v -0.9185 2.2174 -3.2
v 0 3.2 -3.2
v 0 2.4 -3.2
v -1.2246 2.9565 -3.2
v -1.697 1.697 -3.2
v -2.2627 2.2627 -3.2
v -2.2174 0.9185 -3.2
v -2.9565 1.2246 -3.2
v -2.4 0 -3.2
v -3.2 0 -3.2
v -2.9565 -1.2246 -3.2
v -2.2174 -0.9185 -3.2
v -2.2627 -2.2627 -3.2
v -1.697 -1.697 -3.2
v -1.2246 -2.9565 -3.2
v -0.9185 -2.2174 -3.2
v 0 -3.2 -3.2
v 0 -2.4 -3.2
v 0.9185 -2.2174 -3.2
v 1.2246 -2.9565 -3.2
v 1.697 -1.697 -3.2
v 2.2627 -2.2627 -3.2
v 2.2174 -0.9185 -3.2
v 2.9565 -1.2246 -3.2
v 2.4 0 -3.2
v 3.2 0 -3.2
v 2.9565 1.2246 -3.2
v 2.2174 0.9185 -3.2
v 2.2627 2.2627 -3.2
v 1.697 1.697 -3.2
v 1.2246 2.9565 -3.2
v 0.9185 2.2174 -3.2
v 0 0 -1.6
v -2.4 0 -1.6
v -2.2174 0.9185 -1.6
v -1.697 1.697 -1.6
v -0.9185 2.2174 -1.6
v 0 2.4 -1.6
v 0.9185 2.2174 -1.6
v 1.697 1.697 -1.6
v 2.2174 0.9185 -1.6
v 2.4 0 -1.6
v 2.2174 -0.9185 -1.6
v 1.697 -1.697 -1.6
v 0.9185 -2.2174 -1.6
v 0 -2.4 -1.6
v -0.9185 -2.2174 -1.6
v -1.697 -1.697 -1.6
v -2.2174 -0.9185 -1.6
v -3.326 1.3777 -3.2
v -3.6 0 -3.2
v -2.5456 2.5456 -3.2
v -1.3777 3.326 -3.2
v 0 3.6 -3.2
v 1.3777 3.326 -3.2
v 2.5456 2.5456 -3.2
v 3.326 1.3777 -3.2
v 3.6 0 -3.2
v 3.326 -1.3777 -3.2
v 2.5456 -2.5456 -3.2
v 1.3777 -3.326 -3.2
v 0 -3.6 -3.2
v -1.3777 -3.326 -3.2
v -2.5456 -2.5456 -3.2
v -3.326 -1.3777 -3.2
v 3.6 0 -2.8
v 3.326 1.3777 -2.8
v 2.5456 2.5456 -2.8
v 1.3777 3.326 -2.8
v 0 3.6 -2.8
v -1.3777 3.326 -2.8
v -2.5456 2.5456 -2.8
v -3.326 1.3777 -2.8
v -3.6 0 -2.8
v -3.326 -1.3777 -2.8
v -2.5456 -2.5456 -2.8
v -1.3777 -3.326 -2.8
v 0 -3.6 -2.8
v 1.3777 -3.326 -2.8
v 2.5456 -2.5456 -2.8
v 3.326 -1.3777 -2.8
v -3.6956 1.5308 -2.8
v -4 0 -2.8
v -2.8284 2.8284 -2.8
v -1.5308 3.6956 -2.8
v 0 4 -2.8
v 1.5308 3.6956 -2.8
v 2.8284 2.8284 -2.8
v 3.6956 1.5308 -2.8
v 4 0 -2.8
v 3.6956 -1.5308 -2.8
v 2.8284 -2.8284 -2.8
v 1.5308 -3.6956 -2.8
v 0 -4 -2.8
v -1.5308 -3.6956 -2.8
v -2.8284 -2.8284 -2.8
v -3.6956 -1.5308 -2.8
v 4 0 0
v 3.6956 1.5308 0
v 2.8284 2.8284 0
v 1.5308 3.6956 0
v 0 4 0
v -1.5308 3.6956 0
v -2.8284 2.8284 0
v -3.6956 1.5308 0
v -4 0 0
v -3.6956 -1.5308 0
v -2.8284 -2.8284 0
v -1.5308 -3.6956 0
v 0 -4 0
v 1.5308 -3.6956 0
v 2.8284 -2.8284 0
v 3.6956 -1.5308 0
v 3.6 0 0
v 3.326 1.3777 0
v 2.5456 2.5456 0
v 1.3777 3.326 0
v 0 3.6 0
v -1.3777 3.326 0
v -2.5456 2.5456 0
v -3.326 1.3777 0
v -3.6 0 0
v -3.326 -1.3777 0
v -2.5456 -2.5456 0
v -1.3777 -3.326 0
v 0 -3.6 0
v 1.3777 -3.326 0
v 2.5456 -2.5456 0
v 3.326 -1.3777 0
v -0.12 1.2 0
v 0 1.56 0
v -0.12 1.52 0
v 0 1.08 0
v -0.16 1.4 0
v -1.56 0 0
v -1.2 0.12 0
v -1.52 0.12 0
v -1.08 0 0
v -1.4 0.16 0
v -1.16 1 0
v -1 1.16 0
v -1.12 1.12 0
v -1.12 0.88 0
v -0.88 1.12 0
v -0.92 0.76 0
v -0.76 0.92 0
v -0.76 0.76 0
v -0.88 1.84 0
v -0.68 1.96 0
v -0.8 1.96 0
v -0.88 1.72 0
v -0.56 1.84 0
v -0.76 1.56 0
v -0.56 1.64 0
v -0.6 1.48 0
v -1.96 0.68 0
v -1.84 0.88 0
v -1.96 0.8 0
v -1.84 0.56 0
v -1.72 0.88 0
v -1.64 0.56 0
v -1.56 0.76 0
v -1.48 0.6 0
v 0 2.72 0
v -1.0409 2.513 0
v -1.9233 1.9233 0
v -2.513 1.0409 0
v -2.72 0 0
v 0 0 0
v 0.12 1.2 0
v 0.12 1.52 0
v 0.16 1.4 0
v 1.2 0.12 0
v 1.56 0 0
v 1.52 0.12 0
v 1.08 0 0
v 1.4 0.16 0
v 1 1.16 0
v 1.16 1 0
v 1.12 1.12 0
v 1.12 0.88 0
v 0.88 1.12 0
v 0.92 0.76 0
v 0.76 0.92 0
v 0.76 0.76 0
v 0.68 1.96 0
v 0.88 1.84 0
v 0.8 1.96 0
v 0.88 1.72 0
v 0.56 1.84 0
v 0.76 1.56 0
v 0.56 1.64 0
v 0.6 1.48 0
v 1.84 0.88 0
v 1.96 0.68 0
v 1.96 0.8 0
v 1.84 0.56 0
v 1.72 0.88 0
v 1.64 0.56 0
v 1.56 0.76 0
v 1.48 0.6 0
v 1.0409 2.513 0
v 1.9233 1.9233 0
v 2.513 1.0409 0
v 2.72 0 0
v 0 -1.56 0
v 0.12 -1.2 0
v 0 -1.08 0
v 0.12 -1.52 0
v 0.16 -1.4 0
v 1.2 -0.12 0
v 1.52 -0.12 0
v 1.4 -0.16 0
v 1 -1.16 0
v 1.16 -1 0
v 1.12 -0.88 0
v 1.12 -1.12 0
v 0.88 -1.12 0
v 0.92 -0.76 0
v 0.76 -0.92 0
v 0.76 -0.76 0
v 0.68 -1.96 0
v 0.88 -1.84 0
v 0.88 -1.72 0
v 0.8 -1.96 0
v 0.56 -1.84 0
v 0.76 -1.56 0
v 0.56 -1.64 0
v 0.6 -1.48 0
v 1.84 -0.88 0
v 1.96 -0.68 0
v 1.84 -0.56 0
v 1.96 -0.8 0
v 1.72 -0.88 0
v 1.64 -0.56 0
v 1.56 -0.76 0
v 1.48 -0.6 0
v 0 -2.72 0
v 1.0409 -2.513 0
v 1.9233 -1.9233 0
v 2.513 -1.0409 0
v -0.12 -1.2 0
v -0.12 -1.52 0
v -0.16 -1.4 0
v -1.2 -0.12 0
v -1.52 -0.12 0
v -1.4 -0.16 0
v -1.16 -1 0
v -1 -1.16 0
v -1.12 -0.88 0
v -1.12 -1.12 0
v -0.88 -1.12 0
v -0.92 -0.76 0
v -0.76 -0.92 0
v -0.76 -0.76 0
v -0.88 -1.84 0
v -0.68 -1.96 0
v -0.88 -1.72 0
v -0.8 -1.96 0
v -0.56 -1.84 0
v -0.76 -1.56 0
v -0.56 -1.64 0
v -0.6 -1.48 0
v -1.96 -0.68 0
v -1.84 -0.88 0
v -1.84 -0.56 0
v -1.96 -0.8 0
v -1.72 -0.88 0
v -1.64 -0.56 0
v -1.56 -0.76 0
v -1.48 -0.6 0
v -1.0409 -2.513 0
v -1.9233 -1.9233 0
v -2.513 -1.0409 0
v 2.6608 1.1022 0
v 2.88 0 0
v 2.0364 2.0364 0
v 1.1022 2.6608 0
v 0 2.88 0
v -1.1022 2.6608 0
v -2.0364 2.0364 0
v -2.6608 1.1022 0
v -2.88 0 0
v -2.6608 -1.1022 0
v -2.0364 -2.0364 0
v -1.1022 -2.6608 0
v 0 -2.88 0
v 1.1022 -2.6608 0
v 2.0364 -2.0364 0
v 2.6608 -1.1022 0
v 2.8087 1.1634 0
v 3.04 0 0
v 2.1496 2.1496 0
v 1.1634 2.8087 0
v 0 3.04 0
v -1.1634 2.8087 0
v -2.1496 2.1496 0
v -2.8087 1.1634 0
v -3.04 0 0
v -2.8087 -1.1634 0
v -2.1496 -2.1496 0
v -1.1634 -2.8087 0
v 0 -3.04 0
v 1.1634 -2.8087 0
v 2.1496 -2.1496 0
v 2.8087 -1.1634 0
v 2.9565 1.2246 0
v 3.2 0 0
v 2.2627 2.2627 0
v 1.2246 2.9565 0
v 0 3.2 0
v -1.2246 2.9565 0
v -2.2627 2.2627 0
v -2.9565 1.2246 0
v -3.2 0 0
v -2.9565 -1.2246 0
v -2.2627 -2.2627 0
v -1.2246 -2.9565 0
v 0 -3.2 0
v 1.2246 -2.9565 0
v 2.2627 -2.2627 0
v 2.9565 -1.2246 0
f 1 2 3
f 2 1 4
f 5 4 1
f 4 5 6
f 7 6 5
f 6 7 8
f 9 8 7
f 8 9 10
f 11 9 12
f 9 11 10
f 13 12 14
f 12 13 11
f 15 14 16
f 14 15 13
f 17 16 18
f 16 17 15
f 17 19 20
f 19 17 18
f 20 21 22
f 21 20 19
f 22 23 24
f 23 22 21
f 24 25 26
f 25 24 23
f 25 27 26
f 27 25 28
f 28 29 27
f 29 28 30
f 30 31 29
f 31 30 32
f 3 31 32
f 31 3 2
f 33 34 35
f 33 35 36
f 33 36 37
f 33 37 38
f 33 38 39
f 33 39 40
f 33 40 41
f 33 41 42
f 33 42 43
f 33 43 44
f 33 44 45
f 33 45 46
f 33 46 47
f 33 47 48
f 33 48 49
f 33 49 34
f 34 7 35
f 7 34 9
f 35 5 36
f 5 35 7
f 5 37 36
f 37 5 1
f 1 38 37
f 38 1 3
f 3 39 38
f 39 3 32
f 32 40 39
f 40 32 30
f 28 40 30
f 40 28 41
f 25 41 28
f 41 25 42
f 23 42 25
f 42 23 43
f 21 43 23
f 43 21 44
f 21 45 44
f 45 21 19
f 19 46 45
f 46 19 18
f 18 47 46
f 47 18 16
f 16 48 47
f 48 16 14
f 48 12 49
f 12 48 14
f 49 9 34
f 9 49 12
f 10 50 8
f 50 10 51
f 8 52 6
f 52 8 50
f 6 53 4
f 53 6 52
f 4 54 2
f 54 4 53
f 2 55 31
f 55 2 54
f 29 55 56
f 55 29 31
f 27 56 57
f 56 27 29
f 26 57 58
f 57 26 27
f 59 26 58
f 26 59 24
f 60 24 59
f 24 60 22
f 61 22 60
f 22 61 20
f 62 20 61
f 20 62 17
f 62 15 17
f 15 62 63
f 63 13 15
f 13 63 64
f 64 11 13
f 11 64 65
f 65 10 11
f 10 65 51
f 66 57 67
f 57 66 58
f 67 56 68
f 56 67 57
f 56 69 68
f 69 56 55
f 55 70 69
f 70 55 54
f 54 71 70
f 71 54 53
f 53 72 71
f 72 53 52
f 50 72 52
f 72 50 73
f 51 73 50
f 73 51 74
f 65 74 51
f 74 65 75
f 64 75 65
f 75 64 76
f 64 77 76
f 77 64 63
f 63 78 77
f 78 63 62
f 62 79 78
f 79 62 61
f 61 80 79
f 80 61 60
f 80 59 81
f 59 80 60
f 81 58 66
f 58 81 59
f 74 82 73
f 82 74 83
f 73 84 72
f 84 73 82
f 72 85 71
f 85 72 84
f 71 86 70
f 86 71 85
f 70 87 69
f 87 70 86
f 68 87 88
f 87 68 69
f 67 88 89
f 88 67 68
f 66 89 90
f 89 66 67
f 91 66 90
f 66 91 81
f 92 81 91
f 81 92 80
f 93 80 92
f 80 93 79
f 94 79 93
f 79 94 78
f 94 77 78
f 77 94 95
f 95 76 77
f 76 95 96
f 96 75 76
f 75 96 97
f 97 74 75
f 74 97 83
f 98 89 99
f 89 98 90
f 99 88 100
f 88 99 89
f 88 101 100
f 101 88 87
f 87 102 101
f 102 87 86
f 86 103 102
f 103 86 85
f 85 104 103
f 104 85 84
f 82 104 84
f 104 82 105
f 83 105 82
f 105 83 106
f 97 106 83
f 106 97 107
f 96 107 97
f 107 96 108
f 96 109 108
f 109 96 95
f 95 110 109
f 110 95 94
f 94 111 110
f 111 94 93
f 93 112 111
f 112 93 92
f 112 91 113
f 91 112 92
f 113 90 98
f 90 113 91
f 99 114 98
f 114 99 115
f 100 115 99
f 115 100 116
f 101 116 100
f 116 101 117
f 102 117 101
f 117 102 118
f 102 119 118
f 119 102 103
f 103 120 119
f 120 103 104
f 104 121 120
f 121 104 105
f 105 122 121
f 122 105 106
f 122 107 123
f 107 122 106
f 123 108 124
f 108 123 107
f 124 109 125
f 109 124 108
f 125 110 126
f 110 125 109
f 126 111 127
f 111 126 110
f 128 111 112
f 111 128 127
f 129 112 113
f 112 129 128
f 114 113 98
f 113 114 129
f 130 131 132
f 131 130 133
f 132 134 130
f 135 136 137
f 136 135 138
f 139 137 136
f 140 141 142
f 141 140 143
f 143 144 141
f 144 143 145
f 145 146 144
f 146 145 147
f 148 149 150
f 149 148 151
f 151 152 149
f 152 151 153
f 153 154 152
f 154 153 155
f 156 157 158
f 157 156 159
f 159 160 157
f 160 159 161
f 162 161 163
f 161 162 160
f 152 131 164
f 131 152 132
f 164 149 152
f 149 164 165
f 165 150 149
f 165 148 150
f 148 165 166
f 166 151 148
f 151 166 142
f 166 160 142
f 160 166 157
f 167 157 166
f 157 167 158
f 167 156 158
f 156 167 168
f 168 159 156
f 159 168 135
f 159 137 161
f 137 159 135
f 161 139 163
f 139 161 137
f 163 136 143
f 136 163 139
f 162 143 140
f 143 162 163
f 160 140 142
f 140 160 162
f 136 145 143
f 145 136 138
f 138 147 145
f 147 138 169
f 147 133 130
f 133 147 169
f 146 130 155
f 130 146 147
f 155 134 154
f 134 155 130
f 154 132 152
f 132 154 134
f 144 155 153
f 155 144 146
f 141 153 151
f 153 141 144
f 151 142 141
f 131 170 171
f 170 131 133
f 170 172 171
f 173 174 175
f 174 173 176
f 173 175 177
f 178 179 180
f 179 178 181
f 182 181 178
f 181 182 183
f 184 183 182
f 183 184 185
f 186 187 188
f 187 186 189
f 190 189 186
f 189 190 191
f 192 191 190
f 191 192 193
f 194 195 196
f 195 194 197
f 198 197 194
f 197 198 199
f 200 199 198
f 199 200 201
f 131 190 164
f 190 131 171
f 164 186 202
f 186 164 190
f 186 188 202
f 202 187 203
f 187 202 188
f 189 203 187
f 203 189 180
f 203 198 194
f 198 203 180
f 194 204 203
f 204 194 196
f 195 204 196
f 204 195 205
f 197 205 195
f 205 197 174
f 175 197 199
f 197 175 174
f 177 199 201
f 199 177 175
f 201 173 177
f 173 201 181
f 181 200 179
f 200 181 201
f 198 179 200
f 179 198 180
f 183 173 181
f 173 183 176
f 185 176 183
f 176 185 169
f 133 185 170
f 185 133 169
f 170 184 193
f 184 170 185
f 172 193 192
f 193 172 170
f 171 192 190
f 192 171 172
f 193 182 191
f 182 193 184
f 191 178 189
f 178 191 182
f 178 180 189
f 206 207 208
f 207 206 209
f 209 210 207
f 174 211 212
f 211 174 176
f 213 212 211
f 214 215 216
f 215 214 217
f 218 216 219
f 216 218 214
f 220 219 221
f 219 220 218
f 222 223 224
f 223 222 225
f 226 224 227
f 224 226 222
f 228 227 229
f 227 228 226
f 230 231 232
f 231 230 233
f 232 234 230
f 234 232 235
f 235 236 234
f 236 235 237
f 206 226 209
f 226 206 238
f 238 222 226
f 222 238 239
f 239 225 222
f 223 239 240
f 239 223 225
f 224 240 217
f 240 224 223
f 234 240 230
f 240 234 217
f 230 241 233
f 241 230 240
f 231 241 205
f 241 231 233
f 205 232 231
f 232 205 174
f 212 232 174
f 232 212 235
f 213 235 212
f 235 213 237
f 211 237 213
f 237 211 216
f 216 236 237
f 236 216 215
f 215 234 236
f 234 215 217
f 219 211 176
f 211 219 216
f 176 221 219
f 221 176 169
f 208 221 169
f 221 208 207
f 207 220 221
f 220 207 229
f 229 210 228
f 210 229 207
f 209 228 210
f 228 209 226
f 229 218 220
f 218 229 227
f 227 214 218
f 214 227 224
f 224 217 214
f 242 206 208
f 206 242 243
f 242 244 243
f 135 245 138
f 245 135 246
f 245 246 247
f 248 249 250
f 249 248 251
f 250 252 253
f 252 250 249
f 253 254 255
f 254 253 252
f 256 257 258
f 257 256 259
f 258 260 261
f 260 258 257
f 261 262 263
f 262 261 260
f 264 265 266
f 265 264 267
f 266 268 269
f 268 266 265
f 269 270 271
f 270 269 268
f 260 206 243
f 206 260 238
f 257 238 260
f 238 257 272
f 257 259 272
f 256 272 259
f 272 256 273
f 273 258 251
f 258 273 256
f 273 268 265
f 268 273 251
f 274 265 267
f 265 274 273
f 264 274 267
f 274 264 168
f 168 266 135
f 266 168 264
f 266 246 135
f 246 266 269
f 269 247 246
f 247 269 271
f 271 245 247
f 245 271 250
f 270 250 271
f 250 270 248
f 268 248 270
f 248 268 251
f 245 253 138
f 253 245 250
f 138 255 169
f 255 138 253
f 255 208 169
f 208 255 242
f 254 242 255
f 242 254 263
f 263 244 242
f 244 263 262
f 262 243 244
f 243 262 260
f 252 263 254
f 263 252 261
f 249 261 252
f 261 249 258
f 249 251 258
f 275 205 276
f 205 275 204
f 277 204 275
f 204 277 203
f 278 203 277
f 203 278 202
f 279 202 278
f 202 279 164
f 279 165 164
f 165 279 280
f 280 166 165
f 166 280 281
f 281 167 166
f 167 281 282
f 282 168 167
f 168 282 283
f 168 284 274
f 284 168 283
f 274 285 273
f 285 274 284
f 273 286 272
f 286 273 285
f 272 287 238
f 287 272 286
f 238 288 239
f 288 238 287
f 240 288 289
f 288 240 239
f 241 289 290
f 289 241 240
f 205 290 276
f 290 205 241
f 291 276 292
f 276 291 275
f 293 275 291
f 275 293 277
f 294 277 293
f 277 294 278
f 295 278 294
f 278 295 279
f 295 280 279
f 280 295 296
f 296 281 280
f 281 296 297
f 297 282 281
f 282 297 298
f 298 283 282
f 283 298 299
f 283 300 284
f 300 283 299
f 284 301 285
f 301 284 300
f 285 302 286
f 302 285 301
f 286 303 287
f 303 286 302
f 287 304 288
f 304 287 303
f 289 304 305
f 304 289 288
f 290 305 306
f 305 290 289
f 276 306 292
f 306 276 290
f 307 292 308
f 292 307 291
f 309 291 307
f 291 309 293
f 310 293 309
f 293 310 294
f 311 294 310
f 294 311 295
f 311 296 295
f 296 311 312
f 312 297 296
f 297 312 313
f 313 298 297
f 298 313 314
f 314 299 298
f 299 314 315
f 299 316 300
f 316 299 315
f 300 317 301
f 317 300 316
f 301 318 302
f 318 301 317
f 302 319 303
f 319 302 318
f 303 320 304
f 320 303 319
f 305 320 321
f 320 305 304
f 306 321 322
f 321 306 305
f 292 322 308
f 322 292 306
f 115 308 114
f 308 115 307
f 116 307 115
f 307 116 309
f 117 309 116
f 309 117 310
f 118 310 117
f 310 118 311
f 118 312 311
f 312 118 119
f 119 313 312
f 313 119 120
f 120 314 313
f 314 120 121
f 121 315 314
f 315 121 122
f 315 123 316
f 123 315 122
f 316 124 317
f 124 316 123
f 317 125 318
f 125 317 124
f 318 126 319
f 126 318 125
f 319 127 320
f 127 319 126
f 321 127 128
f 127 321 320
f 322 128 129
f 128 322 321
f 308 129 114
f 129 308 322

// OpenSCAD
use <../lib.scad>
use <../p/4-4ering.scad>
use <../p/4-4rin17.scad>
use <../p/4-4rin18.scad>
use <../p/4-4rin19.scad>
use <../p/4-4ring8.scad>
use <s/98138p13s01.scad>
use <s/98138s01.scad>
function ldraw_lib__98138p13() = [
// 0 Tile  1 x  1 Round with Coral Watermelon with Dark Turquoise Rind and Black Seeds Pattern
// 0 Name: 98138p13.dat
// 0 Author: Takeshi Takahashi [RainbowDolphin]
// 0 !LDRAW_ORG Part UPDATE 2022-03
// 0 !LICENSE Licensed under CC BY 2.0 and CC BY 4.0 : see CAreadme.txt
// 
// 0 BFC CERTIFY CCW
  [0,"BFC","CERTIFY"],
  [0,"BFC","CCW"],
// 
// 0 !KEYWORDS Bricklink 98138pb126, Dots, Fruit, Set 41908, Vegetable
// 
// 0 !HISTORY 2022-05-07 [PTadmin] Official Update 2022-03
// 
// 
// 1 16 0 0 0 1 0 0 0 1 0 0 0 1 s\98138s01.dat
  [1,16,0,0,0,1,0,0,0,1,0,0,0,1, ldraw_lib__s__98138s01()],
// 1 16 0 0 0 1 0 0 0 1 0 0 0 1 s\98138p13s01.dat
  [1,16,0,0,0,1,0,0,0,1,0,0,0,1, ldraw_lib__s__98138p13s01()],
// 1 16 0 0 0 -1 0 0 0 1 0 0 0 1 s\98138p13s01.dat
  [1,16,0,0,0,-1,0,0,0,1,0,0,0,1, ldraw_lib__s__98138p13s01()],
// 1 16 0 0 0 -1 0 0 0 1 0 0 0 -1 s\98138p13s01.dat
  [1,16,0,0,0,-1,0,0,0,1,0,0,0,-1, ldraw_lib__s__98138p13s01()],
// 1 16 0 0 0 1 0 0 0 1 0 0 0 -1 s\98138p13s01.dat
  [1,16,0,0,0,1,0,0,0,1,0,0,0,-1, ldraw_lib__s__98138p13s01()],
// 1 353 0 0 0 6.8 0 0 0 1 0 0 0 6.8 4-4ering.dat
  [1,353,0,0,0,6.8,0,0,0,1,0,0,0,6.8, ldraw_lib__4_4ering()],
// 1 15 0 0 0 .4 0 0 0 1 0 0 0 .4 4-4rin17.dat
  [1,15,0,0,0,.4,0,0,0,1,0,0,0,.4, ldraw_lib__4_4rin17()],
// 1 15 0 0 0 .4 0 0 0 1 0 0 0 .4 4-4rin18.dat
  [1,15,0,0,0,.4,0,0,0,1,0,0,0,.4, ldraw_lib__4_4rin18()],
// 1 3 0 0 0 .4 0 0 0 1 0 0 0 .4 4-4rin19.dat
  [1,3,0,0,0,.4,0,0,0,1,0,0,0,.4, ldraw_lib__4_4rin19()],
// 1 3 0 0 0 1 0 0 0 1 0 0 0 1 4-4ring8.dat
  [1,3,0,0,0,1,0,0,0,1,0,0,0,1, ldraw_lib__4_4ring8()],
];
module ldraw_lib__98138p13(step=0, col=false, unit=2/5, alt=false, line=0.2, solid=!$preview)
    makepoly(ldraw_lib__98138p13(), step=step, col=col, unit=unit, alt=alt, line=line, solid=solid);
ldraw_lib__98138p13(line=0.2);
